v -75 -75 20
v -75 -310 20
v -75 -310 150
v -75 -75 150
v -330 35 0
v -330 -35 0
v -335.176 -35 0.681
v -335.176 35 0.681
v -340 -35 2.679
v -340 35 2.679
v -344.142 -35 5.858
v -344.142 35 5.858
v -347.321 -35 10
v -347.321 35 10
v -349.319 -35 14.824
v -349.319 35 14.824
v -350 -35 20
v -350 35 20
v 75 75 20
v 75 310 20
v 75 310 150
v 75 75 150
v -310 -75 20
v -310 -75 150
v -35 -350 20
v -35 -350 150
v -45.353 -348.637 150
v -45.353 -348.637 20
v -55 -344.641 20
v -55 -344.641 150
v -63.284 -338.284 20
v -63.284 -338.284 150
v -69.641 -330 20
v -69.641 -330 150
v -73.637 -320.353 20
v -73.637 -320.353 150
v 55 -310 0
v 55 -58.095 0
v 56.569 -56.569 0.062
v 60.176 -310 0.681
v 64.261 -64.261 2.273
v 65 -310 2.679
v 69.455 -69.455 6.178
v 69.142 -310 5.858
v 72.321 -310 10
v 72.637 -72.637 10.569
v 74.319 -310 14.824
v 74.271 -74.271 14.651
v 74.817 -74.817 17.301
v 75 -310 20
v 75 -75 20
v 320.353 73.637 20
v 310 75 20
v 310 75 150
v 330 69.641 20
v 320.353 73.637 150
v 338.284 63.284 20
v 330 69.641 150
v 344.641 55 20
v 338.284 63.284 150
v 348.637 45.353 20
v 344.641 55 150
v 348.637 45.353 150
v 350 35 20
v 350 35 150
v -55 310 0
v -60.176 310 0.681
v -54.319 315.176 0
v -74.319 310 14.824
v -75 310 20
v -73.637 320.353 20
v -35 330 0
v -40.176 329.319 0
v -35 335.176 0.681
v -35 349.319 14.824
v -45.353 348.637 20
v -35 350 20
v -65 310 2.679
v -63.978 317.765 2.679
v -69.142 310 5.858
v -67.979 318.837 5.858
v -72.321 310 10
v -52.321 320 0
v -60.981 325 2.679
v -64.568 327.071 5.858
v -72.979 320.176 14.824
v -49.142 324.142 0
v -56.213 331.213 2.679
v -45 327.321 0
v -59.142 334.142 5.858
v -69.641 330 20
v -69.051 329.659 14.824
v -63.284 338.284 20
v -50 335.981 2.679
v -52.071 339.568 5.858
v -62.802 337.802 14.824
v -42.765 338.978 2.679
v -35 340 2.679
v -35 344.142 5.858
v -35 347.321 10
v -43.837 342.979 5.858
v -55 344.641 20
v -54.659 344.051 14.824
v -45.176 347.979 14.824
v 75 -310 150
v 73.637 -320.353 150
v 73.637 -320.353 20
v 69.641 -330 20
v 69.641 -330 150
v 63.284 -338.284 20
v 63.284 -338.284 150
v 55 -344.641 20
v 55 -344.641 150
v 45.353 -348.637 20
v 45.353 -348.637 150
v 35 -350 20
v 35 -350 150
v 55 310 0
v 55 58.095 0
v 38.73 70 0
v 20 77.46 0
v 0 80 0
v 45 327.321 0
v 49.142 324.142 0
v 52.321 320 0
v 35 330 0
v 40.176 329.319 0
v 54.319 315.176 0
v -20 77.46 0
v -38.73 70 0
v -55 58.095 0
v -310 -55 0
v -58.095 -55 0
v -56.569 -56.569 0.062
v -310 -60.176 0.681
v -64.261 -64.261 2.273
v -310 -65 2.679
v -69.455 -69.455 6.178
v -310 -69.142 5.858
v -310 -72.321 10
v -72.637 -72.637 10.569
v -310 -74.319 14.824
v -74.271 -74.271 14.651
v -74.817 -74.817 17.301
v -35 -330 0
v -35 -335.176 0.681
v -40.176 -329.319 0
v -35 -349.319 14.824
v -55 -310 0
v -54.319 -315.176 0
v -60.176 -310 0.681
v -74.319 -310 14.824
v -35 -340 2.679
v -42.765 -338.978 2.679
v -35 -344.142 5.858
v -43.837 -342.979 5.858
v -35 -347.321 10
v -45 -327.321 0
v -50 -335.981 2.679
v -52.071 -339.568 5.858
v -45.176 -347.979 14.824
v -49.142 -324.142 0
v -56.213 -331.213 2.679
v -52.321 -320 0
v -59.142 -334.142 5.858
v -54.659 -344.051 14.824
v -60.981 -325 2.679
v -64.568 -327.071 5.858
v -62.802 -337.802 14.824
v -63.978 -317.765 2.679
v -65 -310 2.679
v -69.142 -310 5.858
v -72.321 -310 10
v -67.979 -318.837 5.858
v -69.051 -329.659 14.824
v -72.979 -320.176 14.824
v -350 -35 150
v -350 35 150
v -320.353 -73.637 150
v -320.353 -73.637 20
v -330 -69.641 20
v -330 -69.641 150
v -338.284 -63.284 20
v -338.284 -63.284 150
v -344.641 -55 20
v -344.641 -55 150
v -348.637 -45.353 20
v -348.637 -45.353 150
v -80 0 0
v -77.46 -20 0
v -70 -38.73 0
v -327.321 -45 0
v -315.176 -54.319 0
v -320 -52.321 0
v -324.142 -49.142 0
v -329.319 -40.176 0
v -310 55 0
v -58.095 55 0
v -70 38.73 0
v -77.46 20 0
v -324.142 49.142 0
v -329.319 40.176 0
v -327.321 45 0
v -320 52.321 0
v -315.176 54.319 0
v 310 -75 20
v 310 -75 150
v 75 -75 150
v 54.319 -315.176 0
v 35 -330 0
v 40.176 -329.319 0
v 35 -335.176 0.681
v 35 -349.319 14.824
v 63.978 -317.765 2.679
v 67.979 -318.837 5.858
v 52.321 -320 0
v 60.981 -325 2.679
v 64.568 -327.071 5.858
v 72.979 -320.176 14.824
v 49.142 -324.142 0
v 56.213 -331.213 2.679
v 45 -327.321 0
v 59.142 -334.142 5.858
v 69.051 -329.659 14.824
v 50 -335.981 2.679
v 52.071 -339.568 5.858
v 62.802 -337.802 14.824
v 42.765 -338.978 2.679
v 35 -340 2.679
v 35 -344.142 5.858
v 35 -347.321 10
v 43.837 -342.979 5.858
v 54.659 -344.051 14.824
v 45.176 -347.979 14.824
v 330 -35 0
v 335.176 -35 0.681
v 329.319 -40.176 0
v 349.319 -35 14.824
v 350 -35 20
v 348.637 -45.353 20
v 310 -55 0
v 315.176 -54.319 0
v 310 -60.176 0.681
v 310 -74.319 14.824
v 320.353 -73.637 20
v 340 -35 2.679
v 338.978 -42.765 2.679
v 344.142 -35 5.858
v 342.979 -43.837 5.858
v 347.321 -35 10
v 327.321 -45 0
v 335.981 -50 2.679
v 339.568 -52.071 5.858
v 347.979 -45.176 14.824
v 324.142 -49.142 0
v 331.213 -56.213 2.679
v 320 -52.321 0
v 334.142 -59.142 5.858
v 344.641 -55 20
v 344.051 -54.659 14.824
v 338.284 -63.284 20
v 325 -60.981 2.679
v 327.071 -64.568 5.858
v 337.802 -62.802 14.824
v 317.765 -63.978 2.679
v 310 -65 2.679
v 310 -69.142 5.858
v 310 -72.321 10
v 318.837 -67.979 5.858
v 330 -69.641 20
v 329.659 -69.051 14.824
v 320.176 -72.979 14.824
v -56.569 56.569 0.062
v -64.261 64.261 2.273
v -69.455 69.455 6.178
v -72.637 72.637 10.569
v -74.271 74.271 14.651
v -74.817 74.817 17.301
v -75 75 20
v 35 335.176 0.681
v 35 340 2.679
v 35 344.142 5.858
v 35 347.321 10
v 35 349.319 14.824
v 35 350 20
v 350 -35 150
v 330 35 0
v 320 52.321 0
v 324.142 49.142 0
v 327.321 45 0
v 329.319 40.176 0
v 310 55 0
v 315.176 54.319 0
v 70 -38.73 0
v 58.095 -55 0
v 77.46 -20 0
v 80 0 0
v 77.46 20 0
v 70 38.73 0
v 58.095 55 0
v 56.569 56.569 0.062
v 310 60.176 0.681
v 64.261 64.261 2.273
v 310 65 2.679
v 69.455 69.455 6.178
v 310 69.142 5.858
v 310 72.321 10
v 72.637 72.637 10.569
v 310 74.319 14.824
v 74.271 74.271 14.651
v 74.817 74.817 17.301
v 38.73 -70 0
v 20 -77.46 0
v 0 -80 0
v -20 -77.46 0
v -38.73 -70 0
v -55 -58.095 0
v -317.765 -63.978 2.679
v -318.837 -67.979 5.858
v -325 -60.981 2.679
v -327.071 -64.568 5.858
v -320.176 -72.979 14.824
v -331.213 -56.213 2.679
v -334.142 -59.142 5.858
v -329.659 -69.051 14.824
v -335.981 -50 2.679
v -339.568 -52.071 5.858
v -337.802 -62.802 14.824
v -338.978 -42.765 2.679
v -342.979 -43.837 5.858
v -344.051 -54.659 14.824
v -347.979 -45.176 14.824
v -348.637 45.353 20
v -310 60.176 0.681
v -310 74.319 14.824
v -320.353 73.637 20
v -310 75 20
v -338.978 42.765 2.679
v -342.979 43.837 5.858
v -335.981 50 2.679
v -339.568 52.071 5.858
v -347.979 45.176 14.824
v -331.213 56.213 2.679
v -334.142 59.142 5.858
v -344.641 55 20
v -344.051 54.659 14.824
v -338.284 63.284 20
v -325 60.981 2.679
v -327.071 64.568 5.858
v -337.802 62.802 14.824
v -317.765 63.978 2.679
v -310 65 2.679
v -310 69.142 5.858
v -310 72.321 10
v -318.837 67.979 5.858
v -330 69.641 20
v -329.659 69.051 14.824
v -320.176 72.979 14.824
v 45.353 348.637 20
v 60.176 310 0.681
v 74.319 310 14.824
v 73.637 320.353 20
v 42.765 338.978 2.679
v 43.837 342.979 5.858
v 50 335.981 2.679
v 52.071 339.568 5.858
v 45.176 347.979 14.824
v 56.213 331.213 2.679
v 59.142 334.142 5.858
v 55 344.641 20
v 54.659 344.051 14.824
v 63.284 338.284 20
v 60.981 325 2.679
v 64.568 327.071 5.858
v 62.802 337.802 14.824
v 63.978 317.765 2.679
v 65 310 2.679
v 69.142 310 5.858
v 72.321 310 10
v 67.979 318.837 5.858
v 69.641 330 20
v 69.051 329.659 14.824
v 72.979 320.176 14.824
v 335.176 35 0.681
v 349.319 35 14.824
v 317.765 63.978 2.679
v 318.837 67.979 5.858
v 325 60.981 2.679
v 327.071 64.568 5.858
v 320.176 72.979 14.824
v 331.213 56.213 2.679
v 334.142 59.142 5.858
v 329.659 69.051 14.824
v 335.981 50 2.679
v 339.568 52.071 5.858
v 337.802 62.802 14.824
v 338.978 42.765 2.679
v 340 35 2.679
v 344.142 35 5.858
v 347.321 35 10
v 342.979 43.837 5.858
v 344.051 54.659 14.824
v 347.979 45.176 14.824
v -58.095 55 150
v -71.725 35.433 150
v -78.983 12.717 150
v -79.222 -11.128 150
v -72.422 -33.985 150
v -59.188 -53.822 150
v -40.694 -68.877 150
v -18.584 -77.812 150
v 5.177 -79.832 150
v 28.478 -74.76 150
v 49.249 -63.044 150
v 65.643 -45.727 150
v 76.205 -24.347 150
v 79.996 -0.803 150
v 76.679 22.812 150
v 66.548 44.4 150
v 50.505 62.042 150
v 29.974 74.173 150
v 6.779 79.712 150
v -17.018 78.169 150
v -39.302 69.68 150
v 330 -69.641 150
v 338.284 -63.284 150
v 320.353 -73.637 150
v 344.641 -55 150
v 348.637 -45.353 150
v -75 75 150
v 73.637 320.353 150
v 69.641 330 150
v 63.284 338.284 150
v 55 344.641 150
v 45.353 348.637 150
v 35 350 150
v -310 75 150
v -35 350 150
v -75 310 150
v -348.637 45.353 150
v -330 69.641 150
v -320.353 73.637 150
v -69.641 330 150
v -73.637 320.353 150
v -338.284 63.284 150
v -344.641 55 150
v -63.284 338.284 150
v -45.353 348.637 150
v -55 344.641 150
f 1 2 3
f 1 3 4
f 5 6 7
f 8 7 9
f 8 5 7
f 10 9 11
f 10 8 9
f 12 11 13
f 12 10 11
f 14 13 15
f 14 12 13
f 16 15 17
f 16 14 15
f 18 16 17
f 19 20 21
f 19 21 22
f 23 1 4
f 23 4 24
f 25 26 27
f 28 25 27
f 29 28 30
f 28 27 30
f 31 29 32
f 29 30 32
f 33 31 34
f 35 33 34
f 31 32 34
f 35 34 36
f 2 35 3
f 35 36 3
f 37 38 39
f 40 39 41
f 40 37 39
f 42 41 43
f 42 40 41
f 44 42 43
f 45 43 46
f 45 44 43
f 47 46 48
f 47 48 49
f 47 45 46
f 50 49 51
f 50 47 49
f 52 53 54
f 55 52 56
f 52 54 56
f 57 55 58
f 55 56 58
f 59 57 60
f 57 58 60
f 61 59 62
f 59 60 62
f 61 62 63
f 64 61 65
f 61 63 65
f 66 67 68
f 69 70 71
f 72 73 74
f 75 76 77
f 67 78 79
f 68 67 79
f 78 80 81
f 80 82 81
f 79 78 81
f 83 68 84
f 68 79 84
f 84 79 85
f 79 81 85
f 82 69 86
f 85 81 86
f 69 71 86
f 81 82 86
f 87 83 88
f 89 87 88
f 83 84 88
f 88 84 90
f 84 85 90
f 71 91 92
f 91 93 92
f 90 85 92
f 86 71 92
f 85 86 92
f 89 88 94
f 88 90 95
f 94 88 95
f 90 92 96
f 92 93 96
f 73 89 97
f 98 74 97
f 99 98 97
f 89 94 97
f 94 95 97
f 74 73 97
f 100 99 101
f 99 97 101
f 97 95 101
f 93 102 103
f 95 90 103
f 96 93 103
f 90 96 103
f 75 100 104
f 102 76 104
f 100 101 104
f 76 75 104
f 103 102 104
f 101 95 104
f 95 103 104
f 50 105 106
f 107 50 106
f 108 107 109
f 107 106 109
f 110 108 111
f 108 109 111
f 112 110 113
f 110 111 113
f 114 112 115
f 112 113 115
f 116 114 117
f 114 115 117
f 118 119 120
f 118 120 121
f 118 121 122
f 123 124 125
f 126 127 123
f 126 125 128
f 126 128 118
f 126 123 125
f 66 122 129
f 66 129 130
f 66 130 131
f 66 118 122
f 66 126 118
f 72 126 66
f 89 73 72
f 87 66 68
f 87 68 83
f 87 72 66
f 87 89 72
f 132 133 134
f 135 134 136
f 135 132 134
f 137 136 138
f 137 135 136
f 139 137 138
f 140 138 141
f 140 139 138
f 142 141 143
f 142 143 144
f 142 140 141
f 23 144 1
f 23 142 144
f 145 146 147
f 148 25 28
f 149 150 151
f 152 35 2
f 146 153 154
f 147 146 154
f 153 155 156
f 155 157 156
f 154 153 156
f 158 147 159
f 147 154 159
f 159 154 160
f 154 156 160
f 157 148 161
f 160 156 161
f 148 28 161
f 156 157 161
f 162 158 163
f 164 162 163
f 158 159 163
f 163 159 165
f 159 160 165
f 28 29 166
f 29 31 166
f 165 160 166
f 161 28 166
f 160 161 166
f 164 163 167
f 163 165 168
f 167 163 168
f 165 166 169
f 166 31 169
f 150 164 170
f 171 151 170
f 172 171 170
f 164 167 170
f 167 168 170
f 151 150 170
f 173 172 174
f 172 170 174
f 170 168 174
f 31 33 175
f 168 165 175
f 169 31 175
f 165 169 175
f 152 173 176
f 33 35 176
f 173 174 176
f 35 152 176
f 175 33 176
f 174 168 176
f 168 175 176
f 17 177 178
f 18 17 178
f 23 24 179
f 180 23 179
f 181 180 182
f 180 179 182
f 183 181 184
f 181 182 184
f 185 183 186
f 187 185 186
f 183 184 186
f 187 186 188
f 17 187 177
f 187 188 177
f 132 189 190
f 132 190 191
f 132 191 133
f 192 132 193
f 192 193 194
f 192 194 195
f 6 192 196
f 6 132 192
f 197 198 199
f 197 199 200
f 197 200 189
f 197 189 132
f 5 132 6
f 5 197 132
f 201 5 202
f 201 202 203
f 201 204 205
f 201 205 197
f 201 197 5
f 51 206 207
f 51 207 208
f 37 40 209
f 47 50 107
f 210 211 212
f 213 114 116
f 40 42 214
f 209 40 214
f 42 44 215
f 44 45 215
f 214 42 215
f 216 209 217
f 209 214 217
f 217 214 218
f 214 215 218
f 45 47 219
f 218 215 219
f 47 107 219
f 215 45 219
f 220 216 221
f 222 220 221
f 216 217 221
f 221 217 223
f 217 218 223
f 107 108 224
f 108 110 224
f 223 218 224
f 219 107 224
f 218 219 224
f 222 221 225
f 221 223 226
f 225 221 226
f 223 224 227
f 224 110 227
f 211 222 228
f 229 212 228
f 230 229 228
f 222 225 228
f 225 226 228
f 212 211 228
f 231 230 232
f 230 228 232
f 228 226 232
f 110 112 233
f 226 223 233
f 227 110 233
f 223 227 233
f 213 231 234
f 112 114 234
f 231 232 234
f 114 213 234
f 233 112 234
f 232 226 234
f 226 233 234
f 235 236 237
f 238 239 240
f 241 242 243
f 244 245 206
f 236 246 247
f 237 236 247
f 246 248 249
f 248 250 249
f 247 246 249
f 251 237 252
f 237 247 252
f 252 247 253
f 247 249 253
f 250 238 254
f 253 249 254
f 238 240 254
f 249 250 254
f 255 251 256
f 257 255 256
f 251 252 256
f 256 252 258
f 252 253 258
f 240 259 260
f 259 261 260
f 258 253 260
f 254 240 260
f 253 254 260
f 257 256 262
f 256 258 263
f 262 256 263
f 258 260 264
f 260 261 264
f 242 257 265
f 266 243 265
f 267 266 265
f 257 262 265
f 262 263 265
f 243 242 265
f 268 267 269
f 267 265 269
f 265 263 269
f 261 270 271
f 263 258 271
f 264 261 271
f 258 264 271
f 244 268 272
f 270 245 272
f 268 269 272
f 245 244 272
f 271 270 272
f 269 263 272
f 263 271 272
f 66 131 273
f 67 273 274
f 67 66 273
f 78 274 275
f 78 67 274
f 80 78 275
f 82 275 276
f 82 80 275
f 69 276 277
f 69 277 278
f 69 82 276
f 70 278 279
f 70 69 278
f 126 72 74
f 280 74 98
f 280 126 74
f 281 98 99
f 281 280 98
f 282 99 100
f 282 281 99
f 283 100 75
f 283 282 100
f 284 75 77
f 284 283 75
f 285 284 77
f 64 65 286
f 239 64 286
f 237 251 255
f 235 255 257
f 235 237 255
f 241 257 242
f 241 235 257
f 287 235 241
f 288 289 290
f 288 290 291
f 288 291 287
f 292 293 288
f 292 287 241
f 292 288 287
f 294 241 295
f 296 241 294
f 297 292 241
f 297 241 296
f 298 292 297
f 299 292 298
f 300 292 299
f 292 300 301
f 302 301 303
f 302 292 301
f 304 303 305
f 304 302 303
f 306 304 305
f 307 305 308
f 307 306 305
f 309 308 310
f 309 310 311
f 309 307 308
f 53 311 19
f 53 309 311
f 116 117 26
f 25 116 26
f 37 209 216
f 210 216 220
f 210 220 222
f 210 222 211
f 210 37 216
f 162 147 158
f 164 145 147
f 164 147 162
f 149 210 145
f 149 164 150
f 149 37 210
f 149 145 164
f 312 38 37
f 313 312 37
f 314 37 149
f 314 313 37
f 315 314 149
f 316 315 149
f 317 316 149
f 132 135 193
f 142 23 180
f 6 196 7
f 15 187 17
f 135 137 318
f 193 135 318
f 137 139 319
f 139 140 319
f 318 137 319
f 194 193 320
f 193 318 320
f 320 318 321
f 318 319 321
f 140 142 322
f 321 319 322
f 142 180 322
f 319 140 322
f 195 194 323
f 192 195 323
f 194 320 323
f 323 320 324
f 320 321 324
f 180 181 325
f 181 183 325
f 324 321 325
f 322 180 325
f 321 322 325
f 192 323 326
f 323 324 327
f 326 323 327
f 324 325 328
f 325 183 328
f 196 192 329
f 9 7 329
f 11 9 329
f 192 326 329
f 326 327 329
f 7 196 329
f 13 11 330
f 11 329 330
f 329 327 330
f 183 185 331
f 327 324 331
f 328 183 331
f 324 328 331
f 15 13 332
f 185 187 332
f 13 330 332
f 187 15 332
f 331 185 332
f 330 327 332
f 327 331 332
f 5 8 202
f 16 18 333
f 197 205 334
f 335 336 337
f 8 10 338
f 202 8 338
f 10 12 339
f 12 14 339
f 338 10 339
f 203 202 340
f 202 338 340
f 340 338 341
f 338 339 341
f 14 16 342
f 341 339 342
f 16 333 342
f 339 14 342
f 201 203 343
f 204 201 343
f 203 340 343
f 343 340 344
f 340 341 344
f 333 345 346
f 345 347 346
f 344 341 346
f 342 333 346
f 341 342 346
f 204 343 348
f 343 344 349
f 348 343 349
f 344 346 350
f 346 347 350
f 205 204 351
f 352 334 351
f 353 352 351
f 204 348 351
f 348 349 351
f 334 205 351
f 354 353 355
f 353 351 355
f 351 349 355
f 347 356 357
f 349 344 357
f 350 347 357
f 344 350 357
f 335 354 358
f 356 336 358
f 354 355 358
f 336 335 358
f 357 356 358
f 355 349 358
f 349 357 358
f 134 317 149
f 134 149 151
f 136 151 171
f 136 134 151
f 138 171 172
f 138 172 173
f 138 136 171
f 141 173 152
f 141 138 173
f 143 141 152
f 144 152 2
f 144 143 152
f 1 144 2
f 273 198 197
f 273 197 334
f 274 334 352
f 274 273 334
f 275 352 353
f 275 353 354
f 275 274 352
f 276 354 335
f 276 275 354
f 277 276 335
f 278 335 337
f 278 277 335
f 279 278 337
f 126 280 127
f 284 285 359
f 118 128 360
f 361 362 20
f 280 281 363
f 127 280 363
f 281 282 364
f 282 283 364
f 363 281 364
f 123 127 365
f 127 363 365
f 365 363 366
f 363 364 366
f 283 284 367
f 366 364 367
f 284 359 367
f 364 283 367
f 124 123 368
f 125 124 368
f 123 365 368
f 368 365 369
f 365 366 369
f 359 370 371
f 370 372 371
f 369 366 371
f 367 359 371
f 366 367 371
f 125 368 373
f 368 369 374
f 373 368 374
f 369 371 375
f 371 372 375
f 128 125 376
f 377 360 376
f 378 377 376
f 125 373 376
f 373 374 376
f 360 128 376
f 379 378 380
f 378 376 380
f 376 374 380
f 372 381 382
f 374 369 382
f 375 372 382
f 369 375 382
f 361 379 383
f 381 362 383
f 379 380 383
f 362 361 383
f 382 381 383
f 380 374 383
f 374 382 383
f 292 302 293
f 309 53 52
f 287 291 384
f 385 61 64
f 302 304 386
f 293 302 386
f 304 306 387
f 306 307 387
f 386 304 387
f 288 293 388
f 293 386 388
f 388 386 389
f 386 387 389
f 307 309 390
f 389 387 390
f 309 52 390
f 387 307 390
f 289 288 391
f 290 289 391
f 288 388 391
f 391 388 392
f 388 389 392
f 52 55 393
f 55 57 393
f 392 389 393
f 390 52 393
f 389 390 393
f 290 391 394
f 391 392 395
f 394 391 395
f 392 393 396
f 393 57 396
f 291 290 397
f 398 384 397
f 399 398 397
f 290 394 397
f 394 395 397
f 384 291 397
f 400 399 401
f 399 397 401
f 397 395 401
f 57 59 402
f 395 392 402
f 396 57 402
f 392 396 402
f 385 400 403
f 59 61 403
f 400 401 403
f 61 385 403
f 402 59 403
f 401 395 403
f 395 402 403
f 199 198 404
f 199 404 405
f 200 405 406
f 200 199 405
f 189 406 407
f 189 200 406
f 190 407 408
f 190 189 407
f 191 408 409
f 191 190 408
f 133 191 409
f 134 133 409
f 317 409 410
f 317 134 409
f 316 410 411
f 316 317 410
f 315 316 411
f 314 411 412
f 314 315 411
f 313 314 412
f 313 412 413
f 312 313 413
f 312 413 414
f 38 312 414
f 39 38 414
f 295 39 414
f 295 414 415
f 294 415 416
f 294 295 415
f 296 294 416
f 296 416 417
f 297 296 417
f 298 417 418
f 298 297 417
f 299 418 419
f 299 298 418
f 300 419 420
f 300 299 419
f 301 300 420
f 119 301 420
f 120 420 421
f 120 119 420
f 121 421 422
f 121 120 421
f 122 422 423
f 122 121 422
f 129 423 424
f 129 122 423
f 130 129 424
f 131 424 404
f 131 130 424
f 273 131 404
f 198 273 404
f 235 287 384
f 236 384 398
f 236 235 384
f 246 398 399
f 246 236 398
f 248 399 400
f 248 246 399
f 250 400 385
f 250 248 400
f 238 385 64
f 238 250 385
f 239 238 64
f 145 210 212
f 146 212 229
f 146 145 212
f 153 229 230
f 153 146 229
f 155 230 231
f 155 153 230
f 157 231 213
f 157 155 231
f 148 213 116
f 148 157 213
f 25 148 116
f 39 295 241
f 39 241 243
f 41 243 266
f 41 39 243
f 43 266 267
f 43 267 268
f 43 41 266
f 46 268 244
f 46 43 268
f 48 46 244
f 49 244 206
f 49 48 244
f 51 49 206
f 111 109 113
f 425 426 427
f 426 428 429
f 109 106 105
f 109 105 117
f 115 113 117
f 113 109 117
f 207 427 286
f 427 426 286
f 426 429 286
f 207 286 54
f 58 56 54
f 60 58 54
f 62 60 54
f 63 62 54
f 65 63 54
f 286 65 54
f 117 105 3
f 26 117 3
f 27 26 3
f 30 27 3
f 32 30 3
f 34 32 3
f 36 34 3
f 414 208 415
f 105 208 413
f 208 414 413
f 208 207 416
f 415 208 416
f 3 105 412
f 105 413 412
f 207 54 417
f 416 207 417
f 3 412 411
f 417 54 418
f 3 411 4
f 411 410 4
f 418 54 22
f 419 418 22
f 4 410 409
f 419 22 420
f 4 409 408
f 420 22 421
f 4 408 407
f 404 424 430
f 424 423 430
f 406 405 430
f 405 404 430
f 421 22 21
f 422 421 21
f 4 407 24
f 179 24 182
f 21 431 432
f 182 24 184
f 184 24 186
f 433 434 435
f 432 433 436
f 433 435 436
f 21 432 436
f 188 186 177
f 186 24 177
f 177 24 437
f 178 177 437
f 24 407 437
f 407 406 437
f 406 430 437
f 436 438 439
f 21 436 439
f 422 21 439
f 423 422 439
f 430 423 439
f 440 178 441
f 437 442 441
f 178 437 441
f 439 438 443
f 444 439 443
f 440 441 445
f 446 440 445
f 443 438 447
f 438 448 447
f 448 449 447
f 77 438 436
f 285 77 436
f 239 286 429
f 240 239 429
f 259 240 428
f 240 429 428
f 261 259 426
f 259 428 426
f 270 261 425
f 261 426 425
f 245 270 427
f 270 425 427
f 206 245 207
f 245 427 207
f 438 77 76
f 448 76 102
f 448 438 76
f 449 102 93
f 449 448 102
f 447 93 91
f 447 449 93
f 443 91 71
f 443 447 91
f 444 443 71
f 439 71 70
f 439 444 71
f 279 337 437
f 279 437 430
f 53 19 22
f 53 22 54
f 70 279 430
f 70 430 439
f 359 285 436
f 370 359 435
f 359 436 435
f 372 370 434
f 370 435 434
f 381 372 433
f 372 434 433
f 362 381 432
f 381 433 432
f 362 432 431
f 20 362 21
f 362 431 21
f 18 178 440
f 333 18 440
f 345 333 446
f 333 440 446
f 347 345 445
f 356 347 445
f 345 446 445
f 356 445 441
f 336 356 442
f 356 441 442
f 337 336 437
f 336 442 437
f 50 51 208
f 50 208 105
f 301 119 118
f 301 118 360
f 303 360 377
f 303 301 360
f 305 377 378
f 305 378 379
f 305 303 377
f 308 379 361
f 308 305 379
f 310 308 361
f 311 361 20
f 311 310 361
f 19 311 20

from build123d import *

# Parameters (mm, degrees)
BOSS_EXTRUDE1_DEPTH = 150
FILLET1_R           = 40
FILLET2_R           = 20
SKETCH7_R           = 80
CUT_EXTRUDE1_DEPTH  = 518.204021639


with BuildPart() as part:
    # Sketch2 → Boss-Extrude1 (new body)
    with BuildSketch(Plane.XY):
        Polygon((-75, 350), (75, 350), (75, 75), (350, 75), (350, -75), (75, -75), (75, -350), (-75, -350), (-75, -75), (-350, -75), (-350, 75), (-75, 75), align=None)
    extrude(amount=BOSS_EXTRUDE1_DEPTH)

    # Fillet1
    fillet1_edges = [part.edges().sort_by_distance(p)[0] for p in [
        (75, -350, 75),
        (-75, -350, 75),
        (-350, -75, 75),
        (-350, 75, 75),
        (-75, 350, 75),
        (75, 350, 75),
        (350, 75, 75),
        (350, -75, 75),
    ]]
    fillet(fillet1_edges, radius=FILLET1_R)

    # Fillet2
    fillet2_edges = [part.edges().sort_by_distance(p)[0] for p in [
        (-75, -192.5, 0),
        (-192.5, 75, 0),
        (75, 192.5, 0),
        (192.5, -75, 0),
        (0, 350, 0),
        (75, -192.5, 0),
        (0, -350, 0),
        (-192.5, -75, 0),
        (-350, 0, 0),
        (-75, 192.5, 0),
        (192.5, 75, 0),
        (350, 0, 0),
        (338.284271247, 63.284271247, 0),
        (338.284271247, -63.284271247, 0),
        (63.284271247, -338.284271247, 0),
        (-63.284271247, -338.284271247, 0),
        (-338.284271247, -63.284271247, 0),
        (-338.284271247, 63.284271247, 0),
        (-63.284271247, 338.284271247, 0),
        (63.284271247, 338.284271247, 0),
    ]]
    fillet(fillet2_edges, radius=FILLET2_R)

    # Sketch7 → Cut-Extrude1 (cut, through all)
    with BuildSketch(Plane.XY):
        with Locations(Location((0, 0, 0), (0, 0, 136.567463442))):
            Circle(SKETCH7_R)
    extrude(amount=CUT_EXTRUDE1_DEPTH, mode=Mode.SUBTRACT)


solid = part.part
